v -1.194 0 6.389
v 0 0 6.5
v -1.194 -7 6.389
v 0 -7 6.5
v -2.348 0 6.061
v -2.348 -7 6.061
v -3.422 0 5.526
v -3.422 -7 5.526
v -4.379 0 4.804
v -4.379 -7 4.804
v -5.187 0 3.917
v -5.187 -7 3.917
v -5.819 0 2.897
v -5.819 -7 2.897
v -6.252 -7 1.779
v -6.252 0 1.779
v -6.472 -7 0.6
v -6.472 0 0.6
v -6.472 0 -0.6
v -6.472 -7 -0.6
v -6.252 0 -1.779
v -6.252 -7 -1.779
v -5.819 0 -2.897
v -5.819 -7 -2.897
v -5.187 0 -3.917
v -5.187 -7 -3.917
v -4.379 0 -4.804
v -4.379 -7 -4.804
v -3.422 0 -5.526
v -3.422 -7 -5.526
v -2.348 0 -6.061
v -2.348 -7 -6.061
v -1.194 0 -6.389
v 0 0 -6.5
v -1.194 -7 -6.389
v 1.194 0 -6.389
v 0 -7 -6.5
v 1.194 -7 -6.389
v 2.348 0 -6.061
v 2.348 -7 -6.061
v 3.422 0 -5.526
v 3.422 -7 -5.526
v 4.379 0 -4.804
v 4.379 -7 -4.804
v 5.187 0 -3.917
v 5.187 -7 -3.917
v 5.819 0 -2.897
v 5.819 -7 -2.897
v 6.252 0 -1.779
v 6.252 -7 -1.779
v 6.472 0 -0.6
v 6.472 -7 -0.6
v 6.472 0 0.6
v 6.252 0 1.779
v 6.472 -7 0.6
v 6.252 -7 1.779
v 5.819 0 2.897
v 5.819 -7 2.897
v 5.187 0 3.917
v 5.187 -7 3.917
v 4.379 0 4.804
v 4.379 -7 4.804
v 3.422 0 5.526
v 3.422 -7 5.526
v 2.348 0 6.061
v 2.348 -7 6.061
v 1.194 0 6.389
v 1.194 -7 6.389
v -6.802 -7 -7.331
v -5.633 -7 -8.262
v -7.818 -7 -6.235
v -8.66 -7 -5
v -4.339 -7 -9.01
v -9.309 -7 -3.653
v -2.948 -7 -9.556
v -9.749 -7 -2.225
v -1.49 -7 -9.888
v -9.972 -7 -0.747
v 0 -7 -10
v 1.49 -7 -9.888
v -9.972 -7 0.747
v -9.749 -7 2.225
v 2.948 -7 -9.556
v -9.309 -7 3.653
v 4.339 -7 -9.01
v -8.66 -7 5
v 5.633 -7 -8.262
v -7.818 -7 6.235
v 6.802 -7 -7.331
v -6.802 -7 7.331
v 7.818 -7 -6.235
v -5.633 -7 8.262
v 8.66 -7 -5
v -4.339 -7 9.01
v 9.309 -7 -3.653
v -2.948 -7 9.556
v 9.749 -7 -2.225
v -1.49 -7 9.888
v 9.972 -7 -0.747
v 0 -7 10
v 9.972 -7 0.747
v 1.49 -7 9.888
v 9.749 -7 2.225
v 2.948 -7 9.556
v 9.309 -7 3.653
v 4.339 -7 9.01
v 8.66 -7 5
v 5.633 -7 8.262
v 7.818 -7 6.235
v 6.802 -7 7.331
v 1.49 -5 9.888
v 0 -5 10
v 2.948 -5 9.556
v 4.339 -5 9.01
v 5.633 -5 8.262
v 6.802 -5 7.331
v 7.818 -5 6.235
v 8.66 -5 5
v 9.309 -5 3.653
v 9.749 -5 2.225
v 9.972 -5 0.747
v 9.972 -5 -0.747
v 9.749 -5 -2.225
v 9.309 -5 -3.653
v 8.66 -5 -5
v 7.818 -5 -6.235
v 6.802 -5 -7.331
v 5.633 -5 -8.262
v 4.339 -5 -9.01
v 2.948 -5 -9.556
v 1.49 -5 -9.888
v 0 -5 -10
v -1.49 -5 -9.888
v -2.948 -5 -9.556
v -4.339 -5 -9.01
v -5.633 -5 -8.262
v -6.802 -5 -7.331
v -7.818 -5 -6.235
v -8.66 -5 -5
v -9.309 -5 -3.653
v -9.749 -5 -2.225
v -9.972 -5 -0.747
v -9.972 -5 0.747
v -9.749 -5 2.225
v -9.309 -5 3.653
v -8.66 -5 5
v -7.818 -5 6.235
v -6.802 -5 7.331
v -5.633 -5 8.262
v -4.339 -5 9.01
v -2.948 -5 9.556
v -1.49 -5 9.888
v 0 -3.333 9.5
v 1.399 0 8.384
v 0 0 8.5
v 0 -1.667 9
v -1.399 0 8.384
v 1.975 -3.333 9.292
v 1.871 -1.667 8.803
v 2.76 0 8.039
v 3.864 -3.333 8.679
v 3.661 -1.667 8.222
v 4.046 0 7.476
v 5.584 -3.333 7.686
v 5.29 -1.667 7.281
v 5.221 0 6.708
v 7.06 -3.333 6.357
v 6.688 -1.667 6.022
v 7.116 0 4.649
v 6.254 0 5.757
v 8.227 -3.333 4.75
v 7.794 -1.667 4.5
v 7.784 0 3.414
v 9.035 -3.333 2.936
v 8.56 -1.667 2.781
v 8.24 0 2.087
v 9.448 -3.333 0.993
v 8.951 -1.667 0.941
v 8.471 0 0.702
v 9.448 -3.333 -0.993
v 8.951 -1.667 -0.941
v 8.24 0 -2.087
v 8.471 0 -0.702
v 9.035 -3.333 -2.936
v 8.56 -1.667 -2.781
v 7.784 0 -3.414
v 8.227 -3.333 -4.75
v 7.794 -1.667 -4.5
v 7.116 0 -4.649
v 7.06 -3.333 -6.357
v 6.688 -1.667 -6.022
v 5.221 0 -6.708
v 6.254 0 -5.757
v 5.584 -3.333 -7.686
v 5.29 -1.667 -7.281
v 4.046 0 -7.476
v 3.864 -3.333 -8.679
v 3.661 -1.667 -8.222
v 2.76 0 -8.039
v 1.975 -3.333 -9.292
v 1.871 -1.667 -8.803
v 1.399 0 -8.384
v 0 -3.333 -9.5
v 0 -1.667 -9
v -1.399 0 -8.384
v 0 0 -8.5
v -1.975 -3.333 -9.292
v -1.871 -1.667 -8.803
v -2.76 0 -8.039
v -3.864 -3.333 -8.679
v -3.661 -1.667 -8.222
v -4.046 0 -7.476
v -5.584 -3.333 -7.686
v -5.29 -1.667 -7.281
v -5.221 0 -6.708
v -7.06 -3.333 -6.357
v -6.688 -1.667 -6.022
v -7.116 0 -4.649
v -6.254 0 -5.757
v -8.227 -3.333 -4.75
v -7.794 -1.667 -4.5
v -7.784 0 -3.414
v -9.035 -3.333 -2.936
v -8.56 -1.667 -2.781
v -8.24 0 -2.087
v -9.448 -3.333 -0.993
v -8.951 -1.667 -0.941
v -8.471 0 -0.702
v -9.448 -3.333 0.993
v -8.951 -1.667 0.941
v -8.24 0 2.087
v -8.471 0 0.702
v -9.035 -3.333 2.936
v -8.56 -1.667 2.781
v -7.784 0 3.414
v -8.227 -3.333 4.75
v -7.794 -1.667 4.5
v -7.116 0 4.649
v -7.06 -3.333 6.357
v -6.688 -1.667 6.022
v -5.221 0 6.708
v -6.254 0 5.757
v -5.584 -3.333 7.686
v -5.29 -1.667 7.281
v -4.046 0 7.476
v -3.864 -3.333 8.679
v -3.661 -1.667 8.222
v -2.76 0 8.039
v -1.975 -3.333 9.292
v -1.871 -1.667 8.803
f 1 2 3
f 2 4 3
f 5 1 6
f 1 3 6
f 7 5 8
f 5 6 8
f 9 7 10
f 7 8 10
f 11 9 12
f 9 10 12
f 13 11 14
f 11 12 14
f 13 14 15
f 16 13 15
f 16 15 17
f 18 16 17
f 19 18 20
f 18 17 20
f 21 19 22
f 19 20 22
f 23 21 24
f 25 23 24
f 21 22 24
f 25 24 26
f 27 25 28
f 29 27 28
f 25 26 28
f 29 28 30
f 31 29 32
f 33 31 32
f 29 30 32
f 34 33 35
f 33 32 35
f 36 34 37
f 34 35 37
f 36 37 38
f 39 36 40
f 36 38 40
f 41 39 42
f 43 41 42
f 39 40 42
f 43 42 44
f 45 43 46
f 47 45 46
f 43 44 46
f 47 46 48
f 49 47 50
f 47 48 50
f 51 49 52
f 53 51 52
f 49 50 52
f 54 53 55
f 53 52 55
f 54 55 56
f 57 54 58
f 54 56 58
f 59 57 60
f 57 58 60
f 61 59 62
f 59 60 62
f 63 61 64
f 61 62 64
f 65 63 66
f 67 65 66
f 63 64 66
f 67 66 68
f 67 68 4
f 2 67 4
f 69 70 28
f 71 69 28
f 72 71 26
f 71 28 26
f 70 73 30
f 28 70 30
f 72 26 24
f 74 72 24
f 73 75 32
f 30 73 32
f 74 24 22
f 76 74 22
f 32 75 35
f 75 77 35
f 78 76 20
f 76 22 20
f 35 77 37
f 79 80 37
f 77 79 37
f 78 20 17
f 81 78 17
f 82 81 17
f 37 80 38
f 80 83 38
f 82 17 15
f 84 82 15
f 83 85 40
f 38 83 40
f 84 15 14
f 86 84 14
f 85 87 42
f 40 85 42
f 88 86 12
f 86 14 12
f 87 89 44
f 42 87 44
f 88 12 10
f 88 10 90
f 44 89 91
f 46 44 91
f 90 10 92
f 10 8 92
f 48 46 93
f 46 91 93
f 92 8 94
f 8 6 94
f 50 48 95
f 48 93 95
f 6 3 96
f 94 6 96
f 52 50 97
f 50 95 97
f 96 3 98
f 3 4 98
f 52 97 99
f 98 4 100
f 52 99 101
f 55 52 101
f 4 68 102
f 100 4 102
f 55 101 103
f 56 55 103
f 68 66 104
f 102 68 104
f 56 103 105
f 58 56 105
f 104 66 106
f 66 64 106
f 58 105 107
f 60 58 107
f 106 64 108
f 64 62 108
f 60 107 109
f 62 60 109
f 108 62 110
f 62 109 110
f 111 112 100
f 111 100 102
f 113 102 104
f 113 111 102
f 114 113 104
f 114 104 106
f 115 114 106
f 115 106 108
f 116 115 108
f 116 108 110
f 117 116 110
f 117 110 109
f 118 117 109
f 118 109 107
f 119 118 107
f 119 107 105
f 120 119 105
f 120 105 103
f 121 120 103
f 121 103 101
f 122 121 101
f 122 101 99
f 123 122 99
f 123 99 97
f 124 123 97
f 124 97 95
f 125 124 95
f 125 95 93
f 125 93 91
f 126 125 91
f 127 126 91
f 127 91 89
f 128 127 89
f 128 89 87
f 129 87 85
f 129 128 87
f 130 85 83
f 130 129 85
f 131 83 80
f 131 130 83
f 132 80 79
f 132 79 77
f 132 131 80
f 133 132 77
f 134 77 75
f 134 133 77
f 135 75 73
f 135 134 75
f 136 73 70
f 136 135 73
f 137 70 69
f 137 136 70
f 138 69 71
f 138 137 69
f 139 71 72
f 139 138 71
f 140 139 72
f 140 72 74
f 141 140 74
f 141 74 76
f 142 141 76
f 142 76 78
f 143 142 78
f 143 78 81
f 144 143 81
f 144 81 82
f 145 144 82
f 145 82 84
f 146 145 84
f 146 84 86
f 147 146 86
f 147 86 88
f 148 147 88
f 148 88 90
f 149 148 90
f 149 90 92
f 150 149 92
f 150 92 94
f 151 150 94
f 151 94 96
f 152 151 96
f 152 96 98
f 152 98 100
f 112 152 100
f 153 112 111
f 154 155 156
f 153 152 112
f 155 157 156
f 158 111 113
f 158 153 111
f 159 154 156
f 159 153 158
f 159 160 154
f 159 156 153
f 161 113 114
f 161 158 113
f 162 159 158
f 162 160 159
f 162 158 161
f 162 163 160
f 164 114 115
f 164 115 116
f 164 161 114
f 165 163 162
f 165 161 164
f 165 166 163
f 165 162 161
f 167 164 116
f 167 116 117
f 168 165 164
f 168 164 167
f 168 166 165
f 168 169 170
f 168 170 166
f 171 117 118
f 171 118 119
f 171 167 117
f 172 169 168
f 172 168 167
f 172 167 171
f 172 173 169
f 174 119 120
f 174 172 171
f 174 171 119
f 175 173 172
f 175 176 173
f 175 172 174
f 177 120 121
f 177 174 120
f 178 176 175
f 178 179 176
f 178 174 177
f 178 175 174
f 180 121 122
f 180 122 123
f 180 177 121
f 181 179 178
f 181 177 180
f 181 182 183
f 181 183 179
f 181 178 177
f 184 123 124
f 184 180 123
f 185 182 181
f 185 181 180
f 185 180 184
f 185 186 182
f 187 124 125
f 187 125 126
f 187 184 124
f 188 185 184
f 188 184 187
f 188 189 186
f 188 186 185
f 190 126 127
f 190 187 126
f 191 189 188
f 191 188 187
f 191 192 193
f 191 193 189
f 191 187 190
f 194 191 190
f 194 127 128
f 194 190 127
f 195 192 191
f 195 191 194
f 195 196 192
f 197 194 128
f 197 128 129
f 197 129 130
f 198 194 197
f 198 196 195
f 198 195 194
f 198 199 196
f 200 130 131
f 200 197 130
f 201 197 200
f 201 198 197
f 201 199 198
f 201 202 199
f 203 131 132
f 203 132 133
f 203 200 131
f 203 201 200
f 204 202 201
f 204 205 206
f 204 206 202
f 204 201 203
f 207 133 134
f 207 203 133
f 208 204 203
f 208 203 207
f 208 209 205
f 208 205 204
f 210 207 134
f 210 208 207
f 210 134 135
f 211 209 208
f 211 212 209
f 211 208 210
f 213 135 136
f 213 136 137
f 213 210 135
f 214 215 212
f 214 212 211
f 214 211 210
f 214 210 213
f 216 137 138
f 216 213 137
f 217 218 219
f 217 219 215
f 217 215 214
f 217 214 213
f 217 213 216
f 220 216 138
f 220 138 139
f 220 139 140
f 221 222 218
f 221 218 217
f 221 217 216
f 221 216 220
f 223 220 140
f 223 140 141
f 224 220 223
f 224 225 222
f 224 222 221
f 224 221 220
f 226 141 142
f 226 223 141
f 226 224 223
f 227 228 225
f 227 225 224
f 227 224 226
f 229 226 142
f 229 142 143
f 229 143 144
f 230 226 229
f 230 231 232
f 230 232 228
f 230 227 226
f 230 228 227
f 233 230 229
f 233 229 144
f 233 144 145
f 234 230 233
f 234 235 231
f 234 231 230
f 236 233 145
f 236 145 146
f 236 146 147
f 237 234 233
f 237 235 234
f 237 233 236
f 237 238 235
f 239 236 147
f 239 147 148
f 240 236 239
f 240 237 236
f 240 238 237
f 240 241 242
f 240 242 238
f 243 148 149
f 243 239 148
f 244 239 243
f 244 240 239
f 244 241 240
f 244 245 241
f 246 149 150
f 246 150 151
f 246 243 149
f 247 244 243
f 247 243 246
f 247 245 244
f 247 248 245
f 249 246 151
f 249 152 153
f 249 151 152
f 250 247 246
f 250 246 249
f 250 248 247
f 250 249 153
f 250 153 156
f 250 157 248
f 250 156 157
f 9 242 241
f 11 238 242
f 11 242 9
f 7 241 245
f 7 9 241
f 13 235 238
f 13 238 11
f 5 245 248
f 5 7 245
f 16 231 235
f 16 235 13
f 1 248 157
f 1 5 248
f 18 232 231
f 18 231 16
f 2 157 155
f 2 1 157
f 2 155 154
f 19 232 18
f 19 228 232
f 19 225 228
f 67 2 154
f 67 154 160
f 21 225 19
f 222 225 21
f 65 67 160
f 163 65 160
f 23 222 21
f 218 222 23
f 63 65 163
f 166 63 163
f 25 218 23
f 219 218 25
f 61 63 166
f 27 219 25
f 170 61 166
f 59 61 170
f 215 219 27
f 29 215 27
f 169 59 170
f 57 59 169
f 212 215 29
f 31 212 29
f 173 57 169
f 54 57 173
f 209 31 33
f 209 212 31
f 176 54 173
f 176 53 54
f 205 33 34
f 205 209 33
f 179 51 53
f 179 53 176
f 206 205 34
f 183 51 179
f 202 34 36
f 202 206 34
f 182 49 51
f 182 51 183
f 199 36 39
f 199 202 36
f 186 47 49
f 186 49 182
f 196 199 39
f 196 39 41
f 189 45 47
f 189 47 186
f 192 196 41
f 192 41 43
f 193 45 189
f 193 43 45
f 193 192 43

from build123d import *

# Parameters (mm, degrees)
SKETCH2_R           = 10
SKETCH2_R_2         = 6.5
BOSS_EXTRUDE1_DEPTH = 2
SKETCH1_R           = 8.5
SKETCH4_R           = 6.5
CUT_EXTRUDE1_DEPTH  = 16.000000167


with BuildPart() as part:
    # Sketch2 → Boss-Extrude1 (new body)
    with BuildSketch(Plane(origin=(0, -5, 0), x_dir=(1, 0, 0), z_dir=(0, 1, 0))):
        with Locations(Location((0, 0, 0), (0, 0, 270))):
            Circle(SKETCH2_R)
        with Locations(Location((0, 0, 0), (0, 0, 270))):
            Circle(SKETCH2_R_2, mode=Mode.SUBTRACT)
    extrude(amount=-BOSS_EXTRUDE1_DEPTH)

    # Sketch1 → section 1 of loft6
    with BuildSketch(Plane(origin=(0, 0, 0), x_dir=(1, 0, 0), z_dir=(0, 1, 0)), mode=Mode.PRIVATE) as loft6_s1:
        Circle(SKETCH1_R)
    # loft up to a face of the part (loft6)
    loft([Face(Wire([part.edges().sort_by_distance((7.289686274, -5, -6.845471059))[0]])), loft6_s1.sketch])

    # Sketch4 → Cut-Extrude1 (cut, through all)
    with BuildSketch(Plane.XZ.offset(5)):
        with Locations(Location((0, 0, 0), (0, 0, 90))):
            Circle(SKETCH4_R)
    extrude(amount=-CUT_EXTRUDE1_DEPTH, mode=Mode.SUBTRACT)


solid = part.part
